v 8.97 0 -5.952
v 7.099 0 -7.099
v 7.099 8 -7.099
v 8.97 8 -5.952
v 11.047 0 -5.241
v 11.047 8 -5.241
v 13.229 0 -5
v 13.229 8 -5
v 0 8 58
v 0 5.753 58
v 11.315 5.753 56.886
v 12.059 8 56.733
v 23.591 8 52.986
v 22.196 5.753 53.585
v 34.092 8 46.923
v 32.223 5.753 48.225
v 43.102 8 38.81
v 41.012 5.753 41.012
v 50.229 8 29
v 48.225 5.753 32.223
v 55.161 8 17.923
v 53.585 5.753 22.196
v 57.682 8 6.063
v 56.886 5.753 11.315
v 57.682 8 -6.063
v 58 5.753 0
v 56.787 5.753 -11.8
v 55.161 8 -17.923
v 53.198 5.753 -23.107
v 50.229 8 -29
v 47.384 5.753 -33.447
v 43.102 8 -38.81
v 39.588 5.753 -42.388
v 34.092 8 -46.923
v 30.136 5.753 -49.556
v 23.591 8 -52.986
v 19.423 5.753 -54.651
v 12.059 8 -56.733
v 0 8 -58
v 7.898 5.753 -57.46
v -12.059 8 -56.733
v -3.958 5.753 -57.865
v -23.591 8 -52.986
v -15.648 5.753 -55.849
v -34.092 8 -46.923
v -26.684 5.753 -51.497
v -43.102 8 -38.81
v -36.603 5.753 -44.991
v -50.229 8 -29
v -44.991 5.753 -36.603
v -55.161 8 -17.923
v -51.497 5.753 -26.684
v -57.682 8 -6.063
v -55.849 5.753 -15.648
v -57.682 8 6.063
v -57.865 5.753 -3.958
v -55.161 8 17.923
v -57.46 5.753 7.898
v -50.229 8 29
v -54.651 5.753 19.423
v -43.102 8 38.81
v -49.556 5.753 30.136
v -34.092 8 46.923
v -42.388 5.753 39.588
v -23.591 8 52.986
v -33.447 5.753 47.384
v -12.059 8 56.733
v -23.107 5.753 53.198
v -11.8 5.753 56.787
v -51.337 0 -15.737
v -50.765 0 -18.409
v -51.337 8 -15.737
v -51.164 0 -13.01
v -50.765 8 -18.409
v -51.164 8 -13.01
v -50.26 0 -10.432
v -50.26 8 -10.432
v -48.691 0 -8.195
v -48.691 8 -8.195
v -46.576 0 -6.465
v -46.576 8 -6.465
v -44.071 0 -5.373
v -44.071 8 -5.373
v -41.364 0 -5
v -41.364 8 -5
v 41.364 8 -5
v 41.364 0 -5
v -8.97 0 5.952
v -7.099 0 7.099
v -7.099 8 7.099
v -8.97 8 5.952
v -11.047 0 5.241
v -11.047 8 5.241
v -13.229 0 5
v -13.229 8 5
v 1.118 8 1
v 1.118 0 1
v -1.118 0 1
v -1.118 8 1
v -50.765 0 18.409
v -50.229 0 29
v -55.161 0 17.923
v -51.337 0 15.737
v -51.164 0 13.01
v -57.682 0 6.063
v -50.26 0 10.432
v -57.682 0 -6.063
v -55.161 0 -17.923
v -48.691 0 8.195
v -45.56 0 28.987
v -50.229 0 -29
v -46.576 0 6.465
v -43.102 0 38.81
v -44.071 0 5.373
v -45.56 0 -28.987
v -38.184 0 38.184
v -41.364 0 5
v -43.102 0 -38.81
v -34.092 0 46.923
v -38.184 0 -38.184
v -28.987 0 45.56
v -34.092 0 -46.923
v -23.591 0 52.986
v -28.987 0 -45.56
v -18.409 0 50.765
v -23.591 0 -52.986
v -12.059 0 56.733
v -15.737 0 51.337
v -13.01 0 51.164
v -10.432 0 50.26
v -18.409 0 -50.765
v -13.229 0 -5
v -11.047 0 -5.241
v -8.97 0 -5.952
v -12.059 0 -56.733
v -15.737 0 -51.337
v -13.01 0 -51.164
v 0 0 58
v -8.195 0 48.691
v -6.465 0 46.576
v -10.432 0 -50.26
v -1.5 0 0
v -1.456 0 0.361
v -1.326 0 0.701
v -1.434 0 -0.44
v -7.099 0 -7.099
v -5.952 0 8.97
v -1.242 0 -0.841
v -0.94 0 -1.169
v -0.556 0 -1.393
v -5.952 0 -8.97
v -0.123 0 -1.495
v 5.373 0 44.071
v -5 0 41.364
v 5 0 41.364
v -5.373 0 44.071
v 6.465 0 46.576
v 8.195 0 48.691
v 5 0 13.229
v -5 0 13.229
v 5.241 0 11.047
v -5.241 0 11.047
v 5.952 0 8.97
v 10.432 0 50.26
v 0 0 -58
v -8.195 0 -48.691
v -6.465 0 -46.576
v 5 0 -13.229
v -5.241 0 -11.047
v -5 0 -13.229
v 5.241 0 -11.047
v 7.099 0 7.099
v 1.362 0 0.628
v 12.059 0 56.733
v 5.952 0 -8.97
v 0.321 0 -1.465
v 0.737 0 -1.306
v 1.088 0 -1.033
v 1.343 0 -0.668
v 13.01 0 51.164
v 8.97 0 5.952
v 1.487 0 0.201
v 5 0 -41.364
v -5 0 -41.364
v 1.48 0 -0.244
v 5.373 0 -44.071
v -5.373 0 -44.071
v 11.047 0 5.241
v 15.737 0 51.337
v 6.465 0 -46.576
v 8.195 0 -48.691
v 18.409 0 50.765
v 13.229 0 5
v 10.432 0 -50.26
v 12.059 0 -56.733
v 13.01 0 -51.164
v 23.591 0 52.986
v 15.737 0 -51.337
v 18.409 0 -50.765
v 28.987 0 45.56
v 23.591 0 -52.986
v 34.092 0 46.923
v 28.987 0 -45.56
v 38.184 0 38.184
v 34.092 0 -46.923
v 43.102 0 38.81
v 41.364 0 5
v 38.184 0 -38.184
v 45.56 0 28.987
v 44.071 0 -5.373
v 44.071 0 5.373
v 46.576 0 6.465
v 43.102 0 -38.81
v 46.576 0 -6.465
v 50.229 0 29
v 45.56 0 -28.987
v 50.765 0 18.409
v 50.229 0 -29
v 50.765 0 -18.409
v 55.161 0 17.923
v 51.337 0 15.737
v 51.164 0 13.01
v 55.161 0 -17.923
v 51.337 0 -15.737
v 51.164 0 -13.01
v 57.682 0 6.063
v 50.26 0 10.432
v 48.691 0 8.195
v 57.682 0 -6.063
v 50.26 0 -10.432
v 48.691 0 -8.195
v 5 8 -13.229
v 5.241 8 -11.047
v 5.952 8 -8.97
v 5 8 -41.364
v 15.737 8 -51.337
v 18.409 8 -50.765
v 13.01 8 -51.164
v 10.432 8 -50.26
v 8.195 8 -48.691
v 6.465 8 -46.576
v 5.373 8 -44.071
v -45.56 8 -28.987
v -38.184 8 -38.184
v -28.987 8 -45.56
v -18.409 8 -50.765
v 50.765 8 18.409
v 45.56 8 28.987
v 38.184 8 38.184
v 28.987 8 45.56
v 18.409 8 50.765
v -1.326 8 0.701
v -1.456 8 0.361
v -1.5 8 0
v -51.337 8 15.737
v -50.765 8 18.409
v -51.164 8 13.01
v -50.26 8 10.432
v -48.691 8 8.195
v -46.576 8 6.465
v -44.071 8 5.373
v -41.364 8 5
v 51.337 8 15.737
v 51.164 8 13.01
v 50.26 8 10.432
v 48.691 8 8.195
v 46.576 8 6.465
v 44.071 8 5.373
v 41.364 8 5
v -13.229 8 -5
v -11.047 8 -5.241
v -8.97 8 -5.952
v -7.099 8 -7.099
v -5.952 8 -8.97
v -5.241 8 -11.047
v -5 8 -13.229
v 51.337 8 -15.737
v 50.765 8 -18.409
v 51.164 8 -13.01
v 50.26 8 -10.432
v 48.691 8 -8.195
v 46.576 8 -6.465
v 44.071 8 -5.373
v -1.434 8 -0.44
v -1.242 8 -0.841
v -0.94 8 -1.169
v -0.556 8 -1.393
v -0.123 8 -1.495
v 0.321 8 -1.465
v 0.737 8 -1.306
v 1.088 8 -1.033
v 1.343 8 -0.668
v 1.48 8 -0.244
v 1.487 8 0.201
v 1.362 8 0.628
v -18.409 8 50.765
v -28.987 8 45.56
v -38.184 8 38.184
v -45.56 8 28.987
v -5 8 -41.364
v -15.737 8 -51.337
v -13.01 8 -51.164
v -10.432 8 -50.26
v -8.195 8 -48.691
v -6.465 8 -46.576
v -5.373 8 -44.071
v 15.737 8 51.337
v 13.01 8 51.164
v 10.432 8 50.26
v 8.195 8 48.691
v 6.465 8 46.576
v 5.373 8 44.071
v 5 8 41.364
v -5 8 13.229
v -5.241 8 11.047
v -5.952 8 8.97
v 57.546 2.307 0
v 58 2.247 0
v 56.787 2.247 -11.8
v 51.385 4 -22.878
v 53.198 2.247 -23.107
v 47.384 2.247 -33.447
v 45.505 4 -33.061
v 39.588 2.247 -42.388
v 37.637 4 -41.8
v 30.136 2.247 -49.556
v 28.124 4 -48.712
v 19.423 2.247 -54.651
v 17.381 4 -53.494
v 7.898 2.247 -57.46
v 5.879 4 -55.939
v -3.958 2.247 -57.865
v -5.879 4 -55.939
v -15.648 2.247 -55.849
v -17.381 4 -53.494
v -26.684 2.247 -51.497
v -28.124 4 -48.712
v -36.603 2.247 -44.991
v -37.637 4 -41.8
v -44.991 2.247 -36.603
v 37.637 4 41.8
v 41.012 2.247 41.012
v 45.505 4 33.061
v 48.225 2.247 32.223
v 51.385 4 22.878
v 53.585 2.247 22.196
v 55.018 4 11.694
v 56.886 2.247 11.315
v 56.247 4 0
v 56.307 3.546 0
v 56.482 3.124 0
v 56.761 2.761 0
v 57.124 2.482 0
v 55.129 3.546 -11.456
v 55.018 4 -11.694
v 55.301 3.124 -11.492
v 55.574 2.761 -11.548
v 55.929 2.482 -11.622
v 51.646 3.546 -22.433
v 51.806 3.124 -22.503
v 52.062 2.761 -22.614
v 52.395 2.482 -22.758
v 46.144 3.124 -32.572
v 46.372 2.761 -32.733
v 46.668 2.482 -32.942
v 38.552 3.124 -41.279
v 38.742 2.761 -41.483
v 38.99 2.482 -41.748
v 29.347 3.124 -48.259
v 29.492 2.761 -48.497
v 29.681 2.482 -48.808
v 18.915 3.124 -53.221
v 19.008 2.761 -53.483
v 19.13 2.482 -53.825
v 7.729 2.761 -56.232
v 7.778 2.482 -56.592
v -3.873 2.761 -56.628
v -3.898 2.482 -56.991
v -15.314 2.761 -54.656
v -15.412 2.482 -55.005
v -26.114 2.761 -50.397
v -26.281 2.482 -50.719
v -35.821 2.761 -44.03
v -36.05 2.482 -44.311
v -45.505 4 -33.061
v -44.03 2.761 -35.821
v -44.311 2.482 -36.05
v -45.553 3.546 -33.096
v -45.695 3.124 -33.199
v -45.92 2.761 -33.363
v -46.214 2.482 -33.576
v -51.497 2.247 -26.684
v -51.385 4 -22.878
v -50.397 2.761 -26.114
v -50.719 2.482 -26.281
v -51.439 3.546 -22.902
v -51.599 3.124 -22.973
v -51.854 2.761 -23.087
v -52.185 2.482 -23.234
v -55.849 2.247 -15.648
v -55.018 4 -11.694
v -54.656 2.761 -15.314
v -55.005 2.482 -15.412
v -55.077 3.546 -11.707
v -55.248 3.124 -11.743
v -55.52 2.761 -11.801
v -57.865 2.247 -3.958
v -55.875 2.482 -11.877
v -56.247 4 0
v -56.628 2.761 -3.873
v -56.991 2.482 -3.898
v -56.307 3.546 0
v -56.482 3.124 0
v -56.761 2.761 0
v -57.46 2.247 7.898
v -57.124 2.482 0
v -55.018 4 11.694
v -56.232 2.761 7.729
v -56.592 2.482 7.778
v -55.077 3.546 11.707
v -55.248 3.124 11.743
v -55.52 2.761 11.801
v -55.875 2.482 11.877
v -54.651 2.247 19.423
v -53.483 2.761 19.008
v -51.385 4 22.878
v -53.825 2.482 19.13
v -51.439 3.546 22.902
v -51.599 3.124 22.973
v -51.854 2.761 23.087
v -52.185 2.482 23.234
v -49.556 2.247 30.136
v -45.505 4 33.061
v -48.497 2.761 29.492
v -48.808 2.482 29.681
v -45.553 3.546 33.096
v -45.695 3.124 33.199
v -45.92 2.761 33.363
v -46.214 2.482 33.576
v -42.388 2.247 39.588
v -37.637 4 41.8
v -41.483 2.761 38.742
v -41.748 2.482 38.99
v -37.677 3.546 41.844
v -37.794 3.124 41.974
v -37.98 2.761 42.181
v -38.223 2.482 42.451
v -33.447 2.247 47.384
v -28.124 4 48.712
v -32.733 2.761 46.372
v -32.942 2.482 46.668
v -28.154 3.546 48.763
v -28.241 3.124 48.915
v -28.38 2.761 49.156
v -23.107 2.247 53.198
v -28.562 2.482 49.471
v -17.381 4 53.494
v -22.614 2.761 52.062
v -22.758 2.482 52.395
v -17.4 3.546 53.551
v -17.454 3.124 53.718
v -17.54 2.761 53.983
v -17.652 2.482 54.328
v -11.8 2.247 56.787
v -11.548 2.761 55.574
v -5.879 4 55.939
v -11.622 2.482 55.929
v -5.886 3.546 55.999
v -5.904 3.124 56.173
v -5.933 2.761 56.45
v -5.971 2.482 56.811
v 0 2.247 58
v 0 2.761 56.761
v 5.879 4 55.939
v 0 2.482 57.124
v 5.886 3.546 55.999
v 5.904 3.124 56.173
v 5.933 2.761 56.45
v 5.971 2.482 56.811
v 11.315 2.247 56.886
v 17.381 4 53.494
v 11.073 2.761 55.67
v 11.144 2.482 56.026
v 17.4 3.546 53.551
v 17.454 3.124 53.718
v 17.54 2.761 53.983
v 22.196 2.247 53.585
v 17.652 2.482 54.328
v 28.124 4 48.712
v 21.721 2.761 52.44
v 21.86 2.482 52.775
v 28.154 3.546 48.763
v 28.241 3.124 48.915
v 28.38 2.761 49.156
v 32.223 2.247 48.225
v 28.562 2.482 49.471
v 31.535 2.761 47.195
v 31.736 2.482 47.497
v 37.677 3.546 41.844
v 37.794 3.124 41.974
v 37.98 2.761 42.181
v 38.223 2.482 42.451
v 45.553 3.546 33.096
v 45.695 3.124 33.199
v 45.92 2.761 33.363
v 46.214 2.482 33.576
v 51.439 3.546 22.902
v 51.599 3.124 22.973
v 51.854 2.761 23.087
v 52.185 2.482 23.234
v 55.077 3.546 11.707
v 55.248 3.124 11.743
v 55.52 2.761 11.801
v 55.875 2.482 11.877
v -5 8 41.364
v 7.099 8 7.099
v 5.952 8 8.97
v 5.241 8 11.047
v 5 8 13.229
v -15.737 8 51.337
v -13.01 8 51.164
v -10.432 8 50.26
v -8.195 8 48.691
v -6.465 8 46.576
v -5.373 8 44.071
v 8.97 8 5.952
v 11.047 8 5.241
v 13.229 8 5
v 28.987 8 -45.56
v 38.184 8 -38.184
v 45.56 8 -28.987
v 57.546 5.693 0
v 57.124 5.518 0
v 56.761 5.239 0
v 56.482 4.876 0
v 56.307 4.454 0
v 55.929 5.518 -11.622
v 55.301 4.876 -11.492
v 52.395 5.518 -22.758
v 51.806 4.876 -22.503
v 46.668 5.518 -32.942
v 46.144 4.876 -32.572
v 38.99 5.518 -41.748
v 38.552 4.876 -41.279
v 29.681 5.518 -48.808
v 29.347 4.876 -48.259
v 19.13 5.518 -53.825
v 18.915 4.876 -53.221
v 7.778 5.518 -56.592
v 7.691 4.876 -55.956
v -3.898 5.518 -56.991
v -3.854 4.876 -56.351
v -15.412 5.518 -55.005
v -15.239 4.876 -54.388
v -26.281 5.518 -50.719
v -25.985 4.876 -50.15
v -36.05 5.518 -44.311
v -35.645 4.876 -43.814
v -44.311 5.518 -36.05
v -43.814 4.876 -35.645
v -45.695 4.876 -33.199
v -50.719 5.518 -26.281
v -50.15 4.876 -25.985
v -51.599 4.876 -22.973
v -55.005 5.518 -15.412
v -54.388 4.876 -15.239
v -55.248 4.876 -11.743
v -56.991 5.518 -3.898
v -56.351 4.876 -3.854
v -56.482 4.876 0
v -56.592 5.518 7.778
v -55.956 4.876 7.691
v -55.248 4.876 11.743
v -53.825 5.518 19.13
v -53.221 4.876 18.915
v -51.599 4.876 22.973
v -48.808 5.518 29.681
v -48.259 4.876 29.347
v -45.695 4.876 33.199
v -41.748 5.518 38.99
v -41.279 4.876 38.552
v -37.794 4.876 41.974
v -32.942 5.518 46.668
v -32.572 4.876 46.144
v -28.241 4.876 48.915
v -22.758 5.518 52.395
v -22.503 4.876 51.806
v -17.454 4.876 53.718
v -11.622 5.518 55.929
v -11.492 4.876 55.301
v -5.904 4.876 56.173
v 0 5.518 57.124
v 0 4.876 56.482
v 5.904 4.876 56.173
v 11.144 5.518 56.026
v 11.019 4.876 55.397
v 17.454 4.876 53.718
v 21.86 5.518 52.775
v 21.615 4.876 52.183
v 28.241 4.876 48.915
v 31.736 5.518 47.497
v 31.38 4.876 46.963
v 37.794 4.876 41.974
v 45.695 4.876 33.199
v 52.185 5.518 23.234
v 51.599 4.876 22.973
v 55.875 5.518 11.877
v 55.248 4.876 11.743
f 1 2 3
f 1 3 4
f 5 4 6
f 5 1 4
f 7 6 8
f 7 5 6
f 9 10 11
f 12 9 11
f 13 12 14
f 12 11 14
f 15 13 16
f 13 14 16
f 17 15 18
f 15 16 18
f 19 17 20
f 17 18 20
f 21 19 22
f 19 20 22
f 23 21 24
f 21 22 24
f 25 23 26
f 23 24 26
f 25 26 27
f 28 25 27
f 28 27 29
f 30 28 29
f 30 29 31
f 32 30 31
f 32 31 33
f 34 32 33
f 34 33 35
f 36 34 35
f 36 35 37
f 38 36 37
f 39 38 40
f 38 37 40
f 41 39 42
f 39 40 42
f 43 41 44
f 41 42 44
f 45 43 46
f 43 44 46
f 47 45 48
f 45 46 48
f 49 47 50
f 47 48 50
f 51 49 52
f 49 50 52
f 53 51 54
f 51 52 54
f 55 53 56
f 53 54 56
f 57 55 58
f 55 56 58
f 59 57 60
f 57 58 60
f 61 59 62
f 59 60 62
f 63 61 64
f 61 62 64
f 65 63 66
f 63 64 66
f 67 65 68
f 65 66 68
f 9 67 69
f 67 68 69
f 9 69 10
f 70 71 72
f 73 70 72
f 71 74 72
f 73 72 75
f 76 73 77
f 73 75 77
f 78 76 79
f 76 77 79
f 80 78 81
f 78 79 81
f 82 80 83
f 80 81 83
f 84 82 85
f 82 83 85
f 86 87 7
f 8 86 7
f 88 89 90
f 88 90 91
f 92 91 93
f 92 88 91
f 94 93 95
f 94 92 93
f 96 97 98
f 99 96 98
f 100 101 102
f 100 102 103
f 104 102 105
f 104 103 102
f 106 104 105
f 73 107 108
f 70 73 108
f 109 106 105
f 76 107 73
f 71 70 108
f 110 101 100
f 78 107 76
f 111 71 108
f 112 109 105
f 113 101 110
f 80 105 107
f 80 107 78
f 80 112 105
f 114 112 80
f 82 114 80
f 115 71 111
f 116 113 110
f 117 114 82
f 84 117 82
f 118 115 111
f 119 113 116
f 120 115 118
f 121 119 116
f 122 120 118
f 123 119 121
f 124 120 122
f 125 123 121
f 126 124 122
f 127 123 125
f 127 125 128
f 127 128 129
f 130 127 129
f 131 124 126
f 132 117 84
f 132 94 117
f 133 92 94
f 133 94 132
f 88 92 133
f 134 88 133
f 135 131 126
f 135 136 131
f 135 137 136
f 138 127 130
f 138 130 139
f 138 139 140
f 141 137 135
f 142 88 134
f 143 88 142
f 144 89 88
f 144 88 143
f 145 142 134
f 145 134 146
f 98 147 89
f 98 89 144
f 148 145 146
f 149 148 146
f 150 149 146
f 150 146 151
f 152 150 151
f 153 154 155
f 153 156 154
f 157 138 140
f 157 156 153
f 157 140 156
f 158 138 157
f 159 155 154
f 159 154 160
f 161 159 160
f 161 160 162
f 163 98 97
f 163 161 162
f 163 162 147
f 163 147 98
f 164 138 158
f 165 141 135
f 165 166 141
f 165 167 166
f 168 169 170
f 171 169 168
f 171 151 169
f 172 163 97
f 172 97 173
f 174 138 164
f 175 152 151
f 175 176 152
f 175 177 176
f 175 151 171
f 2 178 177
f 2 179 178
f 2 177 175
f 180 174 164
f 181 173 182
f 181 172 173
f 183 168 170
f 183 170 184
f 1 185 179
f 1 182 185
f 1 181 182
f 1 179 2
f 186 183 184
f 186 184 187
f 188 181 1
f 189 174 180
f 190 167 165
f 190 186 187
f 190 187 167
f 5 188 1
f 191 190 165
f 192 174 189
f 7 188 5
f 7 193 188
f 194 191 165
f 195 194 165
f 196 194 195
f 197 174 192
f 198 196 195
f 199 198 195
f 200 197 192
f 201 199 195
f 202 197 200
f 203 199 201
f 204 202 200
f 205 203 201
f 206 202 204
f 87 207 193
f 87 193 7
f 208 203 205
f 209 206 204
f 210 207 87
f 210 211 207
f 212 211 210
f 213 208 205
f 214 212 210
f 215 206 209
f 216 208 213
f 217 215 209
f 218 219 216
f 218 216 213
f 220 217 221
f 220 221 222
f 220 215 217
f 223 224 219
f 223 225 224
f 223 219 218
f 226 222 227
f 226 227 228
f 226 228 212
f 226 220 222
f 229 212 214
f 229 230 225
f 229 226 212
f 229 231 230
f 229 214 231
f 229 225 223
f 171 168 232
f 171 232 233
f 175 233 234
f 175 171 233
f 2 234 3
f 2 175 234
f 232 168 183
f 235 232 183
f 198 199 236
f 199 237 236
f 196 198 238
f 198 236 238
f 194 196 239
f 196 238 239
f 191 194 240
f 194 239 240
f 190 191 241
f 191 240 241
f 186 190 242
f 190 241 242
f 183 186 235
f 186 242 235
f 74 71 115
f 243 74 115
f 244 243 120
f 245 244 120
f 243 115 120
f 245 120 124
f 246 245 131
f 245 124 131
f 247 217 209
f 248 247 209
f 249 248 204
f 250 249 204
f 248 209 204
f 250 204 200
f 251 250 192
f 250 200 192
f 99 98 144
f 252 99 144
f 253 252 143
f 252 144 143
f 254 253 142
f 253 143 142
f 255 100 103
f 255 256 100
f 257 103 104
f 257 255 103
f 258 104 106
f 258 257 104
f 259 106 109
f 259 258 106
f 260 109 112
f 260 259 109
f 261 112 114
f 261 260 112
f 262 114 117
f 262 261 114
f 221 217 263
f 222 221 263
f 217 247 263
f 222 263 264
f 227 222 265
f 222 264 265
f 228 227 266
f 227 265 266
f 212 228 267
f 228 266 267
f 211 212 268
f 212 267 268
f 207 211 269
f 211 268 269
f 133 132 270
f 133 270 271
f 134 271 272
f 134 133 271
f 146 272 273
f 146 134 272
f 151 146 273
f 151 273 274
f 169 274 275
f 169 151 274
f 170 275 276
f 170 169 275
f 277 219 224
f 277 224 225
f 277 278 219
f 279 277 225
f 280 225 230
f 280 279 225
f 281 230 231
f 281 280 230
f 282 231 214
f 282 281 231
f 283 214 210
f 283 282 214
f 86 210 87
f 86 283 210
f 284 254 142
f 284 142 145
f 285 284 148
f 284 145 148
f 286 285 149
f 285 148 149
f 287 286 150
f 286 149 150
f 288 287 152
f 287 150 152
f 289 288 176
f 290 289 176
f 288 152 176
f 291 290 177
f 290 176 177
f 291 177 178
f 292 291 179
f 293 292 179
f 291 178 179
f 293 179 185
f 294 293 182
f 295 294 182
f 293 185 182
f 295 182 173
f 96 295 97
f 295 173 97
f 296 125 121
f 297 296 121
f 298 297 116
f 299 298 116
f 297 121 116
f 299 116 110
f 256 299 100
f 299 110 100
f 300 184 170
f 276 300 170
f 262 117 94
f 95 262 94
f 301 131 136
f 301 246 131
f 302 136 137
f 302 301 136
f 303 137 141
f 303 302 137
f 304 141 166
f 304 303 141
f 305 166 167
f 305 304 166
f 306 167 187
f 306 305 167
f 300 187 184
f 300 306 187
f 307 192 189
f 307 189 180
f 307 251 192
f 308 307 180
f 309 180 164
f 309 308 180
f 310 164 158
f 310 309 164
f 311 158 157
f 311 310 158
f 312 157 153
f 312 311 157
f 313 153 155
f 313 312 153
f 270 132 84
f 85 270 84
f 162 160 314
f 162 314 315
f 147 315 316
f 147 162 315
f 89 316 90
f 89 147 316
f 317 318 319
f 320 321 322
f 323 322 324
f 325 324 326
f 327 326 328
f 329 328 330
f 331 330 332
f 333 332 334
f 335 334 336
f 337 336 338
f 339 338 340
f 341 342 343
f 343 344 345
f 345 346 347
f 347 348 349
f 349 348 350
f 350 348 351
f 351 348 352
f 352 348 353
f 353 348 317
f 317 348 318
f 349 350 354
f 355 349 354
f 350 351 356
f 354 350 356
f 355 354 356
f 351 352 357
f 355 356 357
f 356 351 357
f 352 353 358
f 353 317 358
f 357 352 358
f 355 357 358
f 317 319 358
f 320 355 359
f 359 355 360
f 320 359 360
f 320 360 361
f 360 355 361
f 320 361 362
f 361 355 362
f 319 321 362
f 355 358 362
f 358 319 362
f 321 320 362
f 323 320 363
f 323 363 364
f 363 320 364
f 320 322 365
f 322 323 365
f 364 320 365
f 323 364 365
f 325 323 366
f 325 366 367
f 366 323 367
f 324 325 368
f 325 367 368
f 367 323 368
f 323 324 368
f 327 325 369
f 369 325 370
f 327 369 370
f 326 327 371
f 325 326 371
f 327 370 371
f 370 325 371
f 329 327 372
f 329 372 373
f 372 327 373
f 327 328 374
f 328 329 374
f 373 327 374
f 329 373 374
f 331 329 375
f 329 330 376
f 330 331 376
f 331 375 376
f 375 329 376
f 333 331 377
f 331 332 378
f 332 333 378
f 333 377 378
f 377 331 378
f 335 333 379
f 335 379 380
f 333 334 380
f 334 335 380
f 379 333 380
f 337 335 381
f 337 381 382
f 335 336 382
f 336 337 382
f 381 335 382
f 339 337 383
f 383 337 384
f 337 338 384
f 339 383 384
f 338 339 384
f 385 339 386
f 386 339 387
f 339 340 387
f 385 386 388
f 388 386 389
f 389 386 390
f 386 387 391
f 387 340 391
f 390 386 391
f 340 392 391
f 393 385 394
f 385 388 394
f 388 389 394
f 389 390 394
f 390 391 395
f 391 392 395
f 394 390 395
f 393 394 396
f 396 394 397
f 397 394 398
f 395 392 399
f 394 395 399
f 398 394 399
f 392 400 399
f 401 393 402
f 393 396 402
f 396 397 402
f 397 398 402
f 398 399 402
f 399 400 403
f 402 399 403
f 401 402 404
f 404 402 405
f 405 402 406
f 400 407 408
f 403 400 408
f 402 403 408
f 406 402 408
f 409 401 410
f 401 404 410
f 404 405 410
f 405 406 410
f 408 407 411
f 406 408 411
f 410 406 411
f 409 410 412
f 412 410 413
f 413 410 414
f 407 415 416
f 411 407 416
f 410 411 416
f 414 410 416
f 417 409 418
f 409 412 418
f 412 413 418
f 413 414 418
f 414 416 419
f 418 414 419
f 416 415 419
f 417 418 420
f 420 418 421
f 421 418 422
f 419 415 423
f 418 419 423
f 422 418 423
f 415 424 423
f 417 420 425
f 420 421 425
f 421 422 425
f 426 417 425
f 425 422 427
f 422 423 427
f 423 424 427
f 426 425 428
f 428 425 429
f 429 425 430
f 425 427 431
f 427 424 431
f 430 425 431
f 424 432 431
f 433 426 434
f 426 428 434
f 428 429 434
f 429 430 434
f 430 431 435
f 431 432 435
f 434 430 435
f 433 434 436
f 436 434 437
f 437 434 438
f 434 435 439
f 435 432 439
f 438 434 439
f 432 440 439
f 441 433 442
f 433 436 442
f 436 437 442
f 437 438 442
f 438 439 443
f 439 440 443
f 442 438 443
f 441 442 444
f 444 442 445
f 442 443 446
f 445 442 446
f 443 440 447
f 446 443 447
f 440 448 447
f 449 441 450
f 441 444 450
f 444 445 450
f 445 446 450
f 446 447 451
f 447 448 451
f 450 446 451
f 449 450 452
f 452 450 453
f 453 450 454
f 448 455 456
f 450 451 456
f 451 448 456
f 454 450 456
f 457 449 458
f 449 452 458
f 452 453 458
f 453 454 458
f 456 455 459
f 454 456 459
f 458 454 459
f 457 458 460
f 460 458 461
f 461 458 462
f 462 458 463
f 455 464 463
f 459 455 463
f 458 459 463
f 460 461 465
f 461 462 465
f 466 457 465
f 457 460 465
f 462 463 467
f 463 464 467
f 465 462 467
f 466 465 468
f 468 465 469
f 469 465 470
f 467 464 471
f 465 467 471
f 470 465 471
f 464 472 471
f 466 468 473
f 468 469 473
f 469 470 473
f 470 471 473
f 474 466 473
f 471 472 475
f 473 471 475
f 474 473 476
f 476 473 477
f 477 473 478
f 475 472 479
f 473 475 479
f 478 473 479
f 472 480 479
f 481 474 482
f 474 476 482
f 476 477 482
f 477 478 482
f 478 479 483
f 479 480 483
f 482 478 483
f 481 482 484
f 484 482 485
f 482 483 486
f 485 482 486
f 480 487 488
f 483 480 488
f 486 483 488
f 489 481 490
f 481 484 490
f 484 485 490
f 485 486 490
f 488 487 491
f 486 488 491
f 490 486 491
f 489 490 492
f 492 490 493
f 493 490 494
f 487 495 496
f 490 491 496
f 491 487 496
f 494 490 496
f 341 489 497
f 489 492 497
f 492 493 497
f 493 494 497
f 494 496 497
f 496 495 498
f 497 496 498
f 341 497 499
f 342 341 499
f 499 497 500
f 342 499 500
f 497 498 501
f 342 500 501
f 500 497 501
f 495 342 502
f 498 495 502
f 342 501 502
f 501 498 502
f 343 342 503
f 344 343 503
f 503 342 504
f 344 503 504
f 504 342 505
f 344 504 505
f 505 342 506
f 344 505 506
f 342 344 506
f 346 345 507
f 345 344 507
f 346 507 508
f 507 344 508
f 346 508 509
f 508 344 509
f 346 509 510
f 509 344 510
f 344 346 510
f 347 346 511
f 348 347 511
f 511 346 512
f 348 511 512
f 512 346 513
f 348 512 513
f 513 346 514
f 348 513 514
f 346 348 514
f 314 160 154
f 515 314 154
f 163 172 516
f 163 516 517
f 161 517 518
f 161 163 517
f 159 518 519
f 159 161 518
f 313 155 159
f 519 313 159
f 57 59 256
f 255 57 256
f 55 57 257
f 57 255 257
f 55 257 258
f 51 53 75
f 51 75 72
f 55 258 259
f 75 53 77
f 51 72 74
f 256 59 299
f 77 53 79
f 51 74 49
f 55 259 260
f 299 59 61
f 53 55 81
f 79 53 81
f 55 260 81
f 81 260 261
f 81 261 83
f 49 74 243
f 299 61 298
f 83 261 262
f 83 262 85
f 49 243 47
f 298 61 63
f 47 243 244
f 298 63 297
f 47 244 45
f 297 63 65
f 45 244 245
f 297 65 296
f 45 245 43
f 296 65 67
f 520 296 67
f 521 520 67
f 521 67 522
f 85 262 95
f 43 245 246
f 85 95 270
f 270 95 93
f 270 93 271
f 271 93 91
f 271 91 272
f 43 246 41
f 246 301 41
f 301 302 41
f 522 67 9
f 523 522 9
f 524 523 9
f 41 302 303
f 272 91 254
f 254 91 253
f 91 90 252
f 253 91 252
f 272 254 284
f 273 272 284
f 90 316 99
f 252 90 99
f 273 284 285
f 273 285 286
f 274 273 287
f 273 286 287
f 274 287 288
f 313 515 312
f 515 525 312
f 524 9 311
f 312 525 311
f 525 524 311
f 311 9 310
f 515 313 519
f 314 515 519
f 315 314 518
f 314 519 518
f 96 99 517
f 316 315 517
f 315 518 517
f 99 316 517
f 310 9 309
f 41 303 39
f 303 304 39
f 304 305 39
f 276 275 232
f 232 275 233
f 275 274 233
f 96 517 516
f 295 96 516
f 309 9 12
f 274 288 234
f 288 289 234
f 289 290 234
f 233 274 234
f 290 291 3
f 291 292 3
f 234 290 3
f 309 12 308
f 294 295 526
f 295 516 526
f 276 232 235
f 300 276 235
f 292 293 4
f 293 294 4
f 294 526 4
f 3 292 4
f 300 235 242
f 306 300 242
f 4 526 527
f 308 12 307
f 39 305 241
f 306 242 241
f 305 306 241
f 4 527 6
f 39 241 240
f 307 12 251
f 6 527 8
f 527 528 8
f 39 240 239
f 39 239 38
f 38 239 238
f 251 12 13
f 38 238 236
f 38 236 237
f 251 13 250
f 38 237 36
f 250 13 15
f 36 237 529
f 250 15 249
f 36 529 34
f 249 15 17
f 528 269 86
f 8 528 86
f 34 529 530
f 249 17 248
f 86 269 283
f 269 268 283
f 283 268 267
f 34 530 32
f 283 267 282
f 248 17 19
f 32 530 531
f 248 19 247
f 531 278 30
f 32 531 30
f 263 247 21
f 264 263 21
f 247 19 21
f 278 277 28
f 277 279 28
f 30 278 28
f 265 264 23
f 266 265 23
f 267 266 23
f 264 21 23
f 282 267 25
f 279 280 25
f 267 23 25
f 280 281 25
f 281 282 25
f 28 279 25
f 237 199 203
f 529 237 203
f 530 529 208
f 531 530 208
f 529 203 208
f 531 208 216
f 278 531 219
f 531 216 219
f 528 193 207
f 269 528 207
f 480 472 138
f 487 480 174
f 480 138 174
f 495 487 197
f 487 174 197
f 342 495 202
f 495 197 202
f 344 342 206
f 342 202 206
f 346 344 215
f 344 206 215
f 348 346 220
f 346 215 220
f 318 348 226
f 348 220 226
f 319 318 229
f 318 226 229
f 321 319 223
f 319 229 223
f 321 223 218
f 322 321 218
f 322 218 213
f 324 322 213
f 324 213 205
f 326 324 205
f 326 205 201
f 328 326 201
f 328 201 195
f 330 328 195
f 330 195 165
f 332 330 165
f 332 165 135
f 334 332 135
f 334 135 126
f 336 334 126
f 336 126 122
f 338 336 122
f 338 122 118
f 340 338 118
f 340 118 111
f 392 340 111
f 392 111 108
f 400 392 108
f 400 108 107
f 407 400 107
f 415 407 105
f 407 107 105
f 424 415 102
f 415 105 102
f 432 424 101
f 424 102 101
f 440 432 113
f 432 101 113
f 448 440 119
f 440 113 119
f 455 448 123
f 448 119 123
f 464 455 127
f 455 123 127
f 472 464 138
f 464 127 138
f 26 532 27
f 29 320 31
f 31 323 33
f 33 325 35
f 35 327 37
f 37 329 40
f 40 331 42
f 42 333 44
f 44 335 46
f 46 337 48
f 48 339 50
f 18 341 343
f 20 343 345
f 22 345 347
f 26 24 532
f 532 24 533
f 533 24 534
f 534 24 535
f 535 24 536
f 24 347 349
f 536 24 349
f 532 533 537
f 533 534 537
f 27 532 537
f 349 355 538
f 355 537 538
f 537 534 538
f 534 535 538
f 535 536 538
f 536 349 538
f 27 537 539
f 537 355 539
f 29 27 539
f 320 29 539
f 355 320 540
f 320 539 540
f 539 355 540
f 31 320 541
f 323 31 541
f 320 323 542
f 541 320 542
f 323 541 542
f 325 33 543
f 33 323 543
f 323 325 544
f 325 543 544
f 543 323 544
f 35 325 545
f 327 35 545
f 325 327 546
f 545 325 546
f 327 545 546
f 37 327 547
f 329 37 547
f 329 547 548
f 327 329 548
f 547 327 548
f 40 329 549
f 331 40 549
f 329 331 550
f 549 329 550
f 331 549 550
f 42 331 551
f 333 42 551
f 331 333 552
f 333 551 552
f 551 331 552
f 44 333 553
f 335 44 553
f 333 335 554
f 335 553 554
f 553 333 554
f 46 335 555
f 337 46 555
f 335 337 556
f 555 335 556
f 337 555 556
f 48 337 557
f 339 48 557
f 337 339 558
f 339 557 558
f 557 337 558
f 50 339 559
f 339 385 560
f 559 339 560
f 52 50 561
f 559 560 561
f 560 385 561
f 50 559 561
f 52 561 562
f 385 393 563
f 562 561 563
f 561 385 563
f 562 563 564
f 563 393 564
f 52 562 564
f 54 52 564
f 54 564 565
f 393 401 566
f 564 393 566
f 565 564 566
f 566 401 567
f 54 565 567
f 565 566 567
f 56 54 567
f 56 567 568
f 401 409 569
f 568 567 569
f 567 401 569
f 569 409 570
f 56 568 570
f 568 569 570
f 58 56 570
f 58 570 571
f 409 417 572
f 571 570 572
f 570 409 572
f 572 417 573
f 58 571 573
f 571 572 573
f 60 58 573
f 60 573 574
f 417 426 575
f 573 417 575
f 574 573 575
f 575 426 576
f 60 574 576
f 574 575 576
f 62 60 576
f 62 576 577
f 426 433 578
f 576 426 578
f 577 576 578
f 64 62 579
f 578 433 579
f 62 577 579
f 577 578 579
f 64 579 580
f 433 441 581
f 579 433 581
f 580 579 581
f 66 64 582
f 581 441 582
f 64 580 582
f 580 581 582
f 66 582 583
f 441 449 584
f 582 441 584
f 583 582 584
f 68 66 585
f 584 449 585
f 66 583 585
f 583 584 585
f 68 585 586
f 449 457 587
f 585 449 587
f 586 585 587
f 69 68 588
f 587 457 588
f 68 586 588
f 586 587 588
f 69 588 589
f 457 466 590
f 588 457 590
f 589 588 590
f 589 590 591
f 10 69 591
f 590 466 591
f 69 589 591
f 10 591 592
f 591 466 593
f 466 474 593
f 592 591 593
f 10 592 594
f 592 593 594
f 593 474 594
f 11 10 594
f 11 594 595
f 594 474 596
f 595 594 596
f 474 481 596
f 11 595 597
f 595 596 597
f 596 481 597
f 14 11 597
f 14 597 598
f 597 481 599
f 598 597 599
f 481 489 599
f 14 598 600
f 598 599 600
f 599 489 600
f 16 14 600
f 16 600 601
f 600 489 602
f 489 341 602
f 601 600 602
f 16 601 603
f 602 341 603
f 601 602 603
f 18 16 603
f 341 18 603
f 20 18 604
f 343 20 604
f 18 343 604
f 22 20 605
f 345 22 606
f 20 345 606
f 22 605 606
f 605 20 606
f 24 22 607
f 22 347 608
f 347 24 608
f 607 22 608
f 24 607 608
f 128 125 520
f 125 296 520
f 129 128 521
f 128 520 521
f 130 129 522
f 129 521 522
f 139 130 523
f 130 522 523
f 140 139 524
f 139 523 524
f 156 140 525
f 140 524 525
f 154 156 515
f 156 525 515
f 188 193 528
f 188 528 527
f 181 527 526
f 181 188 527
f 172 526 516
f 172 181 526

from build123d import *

# Parameters (mm, degrees)
SKETCH_1_R          = 58
EXTRUDE_1_DEPTH     = 8
FILLET_1_R          = 10
FILLET_2_R          = 10
SKETCH_6_R          = 1.7526
CUT_EXTRUDE_1_DEPTH = 20


with BuildPart() as part:
    # 草图1 → 凸台-拉伸1 (new body)
    with BuildSketch(Plane(origin=(0, 0, 0), x_dir=(1, 0, 0), z_dir=(0, 1, 0))):
        with Locations(Location((0, 0, 0), (0, 0, 270))):
            Circle(SKETCH_1_R)
        with BuildLine():
            Line((-5, 53.768020235), (-5, 8.660254038))
            ThreePointArc((-5, 8.660254038), (-7.071067812, 7.071067812), (-8.660254038, 5))
            Line((-8.660254038, 5), (-53.768020235, 5))
            ThreePointArc((-53.768020235, 5), (-38.183766184, 38.183766184), (-5, 53.768020235))
        make_face(mode=Mode.SUBTRACT)
        with BuildLine():
            Line((-53.768020235, -5), (-8.660254038, -5))
            ThreePointArc((-8.660254038, -5), (-7.071067812, -7.071067812), (-5, -8.660254038))
            Line((-5, -8.660254038), (-5, -53.768020235))
            ThreePointArc((-5, -53.768020235), (-38.183766184, -38.183766184), (-53.768020235, -5))
        make_face(mode=Mode.SUBTRACT)
        with BuildLine():
            Line((5, -53.768020235), (5, -8.660254038))
            ThreePointArc((5, -8.660254038), (7.071067812, -7.071067812), (8.660254038, -5))
            Line((8.660254038, -5), (53.768020235, -5))
            ThreePointArc((53.768020235, -5), (38.183766184, -38.183766184), (5, -53.768020235))
        make_face(mode=Mode.SUBTRACT)
        with BuildLine():
            Line((53.768020235, 5), (8.660254038, 5))
            ThreePointArc((8.660254038, 5), (7.071067812, 7.071067812), (5, 8.660254038))
            Line((5, 8.660254038), (5, 53.768020235))
            ThreePointArc((5, 53.768020235), (38.183766184, 38.183766184), (53.768020235, 5))
        make_face(mode=Mode.SUBTRACT)
    extrude(amount=EXTRUDE_1_DEPTH)

    # 圆角1
    fillet_1_edges = [part.edges().sort_by_distance(p)[0] for p in [
        (53.768020235, 4, 5),
        (5, 4, 53.768020235),
        (53.768020235, 4, -5),
        (5, 4, -53.768020235),
        (-5, 4, -53.768020235),
        (-53.768020235, 4, -5),
        (-53.768020235, 4, 5),
        (-5, 4, 53.768020235),
    ]]
    fillet(fillet_1_edges, radius=FILLET_1_R)

    # 圆角2
    # the kernel refuses this fillet: 10 mm, written as the material it adds along each edge
    with BuildSketch(Plane(origin=(5, 0, -8.660254038), x_dir=(0, 0, -1), z_dir=(0, 1, 0)), Plane(origin=(-5, 0, 8.660254038), x_dir=(0, 0, 1), z_dir=(0, 1, 0)), Plane(origin=(-8.660254038, 0, -5), x_dir=(-1, 0, 0), z_dir=(0, 1, 0))) as fillet_2_piece_1:
        with BuildLine():
            CenterArc((4.568502517, -10), FILLET_2_R, 90, 41.409622109)
            ThreePointArc((-2.04587576, -2.5), (-0.921320126, -1.33315892), (0, 0))
            Line((0, 0), (4.568502517, 0))
        make_face()
    extrude(amount=8)
    with BuildSketch(Plane(origin=(8.660254038, 0, -5), x_dir=(1, 0, 0), z_dir=(0, 1, 0)), Plane(origin=(5, 0, 8.660254038), x_dir=(0, 0, 1), z_dir=(0, 1, 0)), Plane(origin=(-8.660254038, 0, 5), x_dir=(-1, 0, 0), z_dir=(0, 1, 0)), Plane(origin=(-5, 0, -8.660254038), x_dir=(0, 0, -1), z_dir=(0, 1, 0))) as fillet_2_piece_2:
        with BuildLine():
            CenterArc((4.568502517, 10), FILLET_2_R, 228.590377891, 41.409622109)
            ThreePointArc((-2.04587576, 2.5), (-0.921320126, 1.33315892), (0, 0))
            Line((0, 0), (4.568502517, 0))
        make_face()
    extrude(amount=8)
    with BuildSketch(Plane(origin=(8.660254038, 0, 5), x_dir=(-0.6333158920043416, 0, 0.7738933911946432), z_dir=(0, 1, 0))) as fillet_2_piece_3:
        with BuildLine():
            CenterArc((4.845628665, 9.868692826), FILLET_2_R, 219.295188945, 41.409622109)
            Line((-2.893305247, 3.535533906), (0, 0))
            ThreePointArc((0, 0), (1.615209555, 0.131307174), (3.23041911, 0))
        make_face()
    extrude(amount=8)

    # 切除-扫描1: sweep along a path in 草图5
    with BuildLine(Plane(origin=(0, 4, 0), x_dir=(1, 0, 0), z_dir=(0, 1, 0))) as sweep_1_path:
        CenterArc((0, 0), 58, 0, 360)
    # 草图6 → 切除-扫描1 (sweep, cut)
    with BuildSketch(Plane.XY):
        with Locations((-58, 4)):
            Circle(SKETCH_6_R)
    sweep(path=sweep_1_path.line, mode=Mode.SUBTRACT)

    # 草图7 → 切除-拉伸1 (cut)
    with BuildSketch(Plane(origin=(0, 0, 0), x_dir=(-1, 0, 0), z_dir=(0, -1, 0))):
        with BuildLine():
            Line((-1.118033989, -1), (-0.213422781, -1))
            Line((-0.213422781, -1), (1.118033989, -1))
            ThreePointArc((1.118033989, -1), (1.401258538, -0.535233135), (1.5, 0))
            ThreePointArc((1.5, 0), (-0.535233135, 1.401258538), (-1.118033989, -1))
        make_face()
    extrude(amount=-CUT_EXTRUDE_1_DEPTH, mode=Mode.SUBTRACT)


solid = part.part
